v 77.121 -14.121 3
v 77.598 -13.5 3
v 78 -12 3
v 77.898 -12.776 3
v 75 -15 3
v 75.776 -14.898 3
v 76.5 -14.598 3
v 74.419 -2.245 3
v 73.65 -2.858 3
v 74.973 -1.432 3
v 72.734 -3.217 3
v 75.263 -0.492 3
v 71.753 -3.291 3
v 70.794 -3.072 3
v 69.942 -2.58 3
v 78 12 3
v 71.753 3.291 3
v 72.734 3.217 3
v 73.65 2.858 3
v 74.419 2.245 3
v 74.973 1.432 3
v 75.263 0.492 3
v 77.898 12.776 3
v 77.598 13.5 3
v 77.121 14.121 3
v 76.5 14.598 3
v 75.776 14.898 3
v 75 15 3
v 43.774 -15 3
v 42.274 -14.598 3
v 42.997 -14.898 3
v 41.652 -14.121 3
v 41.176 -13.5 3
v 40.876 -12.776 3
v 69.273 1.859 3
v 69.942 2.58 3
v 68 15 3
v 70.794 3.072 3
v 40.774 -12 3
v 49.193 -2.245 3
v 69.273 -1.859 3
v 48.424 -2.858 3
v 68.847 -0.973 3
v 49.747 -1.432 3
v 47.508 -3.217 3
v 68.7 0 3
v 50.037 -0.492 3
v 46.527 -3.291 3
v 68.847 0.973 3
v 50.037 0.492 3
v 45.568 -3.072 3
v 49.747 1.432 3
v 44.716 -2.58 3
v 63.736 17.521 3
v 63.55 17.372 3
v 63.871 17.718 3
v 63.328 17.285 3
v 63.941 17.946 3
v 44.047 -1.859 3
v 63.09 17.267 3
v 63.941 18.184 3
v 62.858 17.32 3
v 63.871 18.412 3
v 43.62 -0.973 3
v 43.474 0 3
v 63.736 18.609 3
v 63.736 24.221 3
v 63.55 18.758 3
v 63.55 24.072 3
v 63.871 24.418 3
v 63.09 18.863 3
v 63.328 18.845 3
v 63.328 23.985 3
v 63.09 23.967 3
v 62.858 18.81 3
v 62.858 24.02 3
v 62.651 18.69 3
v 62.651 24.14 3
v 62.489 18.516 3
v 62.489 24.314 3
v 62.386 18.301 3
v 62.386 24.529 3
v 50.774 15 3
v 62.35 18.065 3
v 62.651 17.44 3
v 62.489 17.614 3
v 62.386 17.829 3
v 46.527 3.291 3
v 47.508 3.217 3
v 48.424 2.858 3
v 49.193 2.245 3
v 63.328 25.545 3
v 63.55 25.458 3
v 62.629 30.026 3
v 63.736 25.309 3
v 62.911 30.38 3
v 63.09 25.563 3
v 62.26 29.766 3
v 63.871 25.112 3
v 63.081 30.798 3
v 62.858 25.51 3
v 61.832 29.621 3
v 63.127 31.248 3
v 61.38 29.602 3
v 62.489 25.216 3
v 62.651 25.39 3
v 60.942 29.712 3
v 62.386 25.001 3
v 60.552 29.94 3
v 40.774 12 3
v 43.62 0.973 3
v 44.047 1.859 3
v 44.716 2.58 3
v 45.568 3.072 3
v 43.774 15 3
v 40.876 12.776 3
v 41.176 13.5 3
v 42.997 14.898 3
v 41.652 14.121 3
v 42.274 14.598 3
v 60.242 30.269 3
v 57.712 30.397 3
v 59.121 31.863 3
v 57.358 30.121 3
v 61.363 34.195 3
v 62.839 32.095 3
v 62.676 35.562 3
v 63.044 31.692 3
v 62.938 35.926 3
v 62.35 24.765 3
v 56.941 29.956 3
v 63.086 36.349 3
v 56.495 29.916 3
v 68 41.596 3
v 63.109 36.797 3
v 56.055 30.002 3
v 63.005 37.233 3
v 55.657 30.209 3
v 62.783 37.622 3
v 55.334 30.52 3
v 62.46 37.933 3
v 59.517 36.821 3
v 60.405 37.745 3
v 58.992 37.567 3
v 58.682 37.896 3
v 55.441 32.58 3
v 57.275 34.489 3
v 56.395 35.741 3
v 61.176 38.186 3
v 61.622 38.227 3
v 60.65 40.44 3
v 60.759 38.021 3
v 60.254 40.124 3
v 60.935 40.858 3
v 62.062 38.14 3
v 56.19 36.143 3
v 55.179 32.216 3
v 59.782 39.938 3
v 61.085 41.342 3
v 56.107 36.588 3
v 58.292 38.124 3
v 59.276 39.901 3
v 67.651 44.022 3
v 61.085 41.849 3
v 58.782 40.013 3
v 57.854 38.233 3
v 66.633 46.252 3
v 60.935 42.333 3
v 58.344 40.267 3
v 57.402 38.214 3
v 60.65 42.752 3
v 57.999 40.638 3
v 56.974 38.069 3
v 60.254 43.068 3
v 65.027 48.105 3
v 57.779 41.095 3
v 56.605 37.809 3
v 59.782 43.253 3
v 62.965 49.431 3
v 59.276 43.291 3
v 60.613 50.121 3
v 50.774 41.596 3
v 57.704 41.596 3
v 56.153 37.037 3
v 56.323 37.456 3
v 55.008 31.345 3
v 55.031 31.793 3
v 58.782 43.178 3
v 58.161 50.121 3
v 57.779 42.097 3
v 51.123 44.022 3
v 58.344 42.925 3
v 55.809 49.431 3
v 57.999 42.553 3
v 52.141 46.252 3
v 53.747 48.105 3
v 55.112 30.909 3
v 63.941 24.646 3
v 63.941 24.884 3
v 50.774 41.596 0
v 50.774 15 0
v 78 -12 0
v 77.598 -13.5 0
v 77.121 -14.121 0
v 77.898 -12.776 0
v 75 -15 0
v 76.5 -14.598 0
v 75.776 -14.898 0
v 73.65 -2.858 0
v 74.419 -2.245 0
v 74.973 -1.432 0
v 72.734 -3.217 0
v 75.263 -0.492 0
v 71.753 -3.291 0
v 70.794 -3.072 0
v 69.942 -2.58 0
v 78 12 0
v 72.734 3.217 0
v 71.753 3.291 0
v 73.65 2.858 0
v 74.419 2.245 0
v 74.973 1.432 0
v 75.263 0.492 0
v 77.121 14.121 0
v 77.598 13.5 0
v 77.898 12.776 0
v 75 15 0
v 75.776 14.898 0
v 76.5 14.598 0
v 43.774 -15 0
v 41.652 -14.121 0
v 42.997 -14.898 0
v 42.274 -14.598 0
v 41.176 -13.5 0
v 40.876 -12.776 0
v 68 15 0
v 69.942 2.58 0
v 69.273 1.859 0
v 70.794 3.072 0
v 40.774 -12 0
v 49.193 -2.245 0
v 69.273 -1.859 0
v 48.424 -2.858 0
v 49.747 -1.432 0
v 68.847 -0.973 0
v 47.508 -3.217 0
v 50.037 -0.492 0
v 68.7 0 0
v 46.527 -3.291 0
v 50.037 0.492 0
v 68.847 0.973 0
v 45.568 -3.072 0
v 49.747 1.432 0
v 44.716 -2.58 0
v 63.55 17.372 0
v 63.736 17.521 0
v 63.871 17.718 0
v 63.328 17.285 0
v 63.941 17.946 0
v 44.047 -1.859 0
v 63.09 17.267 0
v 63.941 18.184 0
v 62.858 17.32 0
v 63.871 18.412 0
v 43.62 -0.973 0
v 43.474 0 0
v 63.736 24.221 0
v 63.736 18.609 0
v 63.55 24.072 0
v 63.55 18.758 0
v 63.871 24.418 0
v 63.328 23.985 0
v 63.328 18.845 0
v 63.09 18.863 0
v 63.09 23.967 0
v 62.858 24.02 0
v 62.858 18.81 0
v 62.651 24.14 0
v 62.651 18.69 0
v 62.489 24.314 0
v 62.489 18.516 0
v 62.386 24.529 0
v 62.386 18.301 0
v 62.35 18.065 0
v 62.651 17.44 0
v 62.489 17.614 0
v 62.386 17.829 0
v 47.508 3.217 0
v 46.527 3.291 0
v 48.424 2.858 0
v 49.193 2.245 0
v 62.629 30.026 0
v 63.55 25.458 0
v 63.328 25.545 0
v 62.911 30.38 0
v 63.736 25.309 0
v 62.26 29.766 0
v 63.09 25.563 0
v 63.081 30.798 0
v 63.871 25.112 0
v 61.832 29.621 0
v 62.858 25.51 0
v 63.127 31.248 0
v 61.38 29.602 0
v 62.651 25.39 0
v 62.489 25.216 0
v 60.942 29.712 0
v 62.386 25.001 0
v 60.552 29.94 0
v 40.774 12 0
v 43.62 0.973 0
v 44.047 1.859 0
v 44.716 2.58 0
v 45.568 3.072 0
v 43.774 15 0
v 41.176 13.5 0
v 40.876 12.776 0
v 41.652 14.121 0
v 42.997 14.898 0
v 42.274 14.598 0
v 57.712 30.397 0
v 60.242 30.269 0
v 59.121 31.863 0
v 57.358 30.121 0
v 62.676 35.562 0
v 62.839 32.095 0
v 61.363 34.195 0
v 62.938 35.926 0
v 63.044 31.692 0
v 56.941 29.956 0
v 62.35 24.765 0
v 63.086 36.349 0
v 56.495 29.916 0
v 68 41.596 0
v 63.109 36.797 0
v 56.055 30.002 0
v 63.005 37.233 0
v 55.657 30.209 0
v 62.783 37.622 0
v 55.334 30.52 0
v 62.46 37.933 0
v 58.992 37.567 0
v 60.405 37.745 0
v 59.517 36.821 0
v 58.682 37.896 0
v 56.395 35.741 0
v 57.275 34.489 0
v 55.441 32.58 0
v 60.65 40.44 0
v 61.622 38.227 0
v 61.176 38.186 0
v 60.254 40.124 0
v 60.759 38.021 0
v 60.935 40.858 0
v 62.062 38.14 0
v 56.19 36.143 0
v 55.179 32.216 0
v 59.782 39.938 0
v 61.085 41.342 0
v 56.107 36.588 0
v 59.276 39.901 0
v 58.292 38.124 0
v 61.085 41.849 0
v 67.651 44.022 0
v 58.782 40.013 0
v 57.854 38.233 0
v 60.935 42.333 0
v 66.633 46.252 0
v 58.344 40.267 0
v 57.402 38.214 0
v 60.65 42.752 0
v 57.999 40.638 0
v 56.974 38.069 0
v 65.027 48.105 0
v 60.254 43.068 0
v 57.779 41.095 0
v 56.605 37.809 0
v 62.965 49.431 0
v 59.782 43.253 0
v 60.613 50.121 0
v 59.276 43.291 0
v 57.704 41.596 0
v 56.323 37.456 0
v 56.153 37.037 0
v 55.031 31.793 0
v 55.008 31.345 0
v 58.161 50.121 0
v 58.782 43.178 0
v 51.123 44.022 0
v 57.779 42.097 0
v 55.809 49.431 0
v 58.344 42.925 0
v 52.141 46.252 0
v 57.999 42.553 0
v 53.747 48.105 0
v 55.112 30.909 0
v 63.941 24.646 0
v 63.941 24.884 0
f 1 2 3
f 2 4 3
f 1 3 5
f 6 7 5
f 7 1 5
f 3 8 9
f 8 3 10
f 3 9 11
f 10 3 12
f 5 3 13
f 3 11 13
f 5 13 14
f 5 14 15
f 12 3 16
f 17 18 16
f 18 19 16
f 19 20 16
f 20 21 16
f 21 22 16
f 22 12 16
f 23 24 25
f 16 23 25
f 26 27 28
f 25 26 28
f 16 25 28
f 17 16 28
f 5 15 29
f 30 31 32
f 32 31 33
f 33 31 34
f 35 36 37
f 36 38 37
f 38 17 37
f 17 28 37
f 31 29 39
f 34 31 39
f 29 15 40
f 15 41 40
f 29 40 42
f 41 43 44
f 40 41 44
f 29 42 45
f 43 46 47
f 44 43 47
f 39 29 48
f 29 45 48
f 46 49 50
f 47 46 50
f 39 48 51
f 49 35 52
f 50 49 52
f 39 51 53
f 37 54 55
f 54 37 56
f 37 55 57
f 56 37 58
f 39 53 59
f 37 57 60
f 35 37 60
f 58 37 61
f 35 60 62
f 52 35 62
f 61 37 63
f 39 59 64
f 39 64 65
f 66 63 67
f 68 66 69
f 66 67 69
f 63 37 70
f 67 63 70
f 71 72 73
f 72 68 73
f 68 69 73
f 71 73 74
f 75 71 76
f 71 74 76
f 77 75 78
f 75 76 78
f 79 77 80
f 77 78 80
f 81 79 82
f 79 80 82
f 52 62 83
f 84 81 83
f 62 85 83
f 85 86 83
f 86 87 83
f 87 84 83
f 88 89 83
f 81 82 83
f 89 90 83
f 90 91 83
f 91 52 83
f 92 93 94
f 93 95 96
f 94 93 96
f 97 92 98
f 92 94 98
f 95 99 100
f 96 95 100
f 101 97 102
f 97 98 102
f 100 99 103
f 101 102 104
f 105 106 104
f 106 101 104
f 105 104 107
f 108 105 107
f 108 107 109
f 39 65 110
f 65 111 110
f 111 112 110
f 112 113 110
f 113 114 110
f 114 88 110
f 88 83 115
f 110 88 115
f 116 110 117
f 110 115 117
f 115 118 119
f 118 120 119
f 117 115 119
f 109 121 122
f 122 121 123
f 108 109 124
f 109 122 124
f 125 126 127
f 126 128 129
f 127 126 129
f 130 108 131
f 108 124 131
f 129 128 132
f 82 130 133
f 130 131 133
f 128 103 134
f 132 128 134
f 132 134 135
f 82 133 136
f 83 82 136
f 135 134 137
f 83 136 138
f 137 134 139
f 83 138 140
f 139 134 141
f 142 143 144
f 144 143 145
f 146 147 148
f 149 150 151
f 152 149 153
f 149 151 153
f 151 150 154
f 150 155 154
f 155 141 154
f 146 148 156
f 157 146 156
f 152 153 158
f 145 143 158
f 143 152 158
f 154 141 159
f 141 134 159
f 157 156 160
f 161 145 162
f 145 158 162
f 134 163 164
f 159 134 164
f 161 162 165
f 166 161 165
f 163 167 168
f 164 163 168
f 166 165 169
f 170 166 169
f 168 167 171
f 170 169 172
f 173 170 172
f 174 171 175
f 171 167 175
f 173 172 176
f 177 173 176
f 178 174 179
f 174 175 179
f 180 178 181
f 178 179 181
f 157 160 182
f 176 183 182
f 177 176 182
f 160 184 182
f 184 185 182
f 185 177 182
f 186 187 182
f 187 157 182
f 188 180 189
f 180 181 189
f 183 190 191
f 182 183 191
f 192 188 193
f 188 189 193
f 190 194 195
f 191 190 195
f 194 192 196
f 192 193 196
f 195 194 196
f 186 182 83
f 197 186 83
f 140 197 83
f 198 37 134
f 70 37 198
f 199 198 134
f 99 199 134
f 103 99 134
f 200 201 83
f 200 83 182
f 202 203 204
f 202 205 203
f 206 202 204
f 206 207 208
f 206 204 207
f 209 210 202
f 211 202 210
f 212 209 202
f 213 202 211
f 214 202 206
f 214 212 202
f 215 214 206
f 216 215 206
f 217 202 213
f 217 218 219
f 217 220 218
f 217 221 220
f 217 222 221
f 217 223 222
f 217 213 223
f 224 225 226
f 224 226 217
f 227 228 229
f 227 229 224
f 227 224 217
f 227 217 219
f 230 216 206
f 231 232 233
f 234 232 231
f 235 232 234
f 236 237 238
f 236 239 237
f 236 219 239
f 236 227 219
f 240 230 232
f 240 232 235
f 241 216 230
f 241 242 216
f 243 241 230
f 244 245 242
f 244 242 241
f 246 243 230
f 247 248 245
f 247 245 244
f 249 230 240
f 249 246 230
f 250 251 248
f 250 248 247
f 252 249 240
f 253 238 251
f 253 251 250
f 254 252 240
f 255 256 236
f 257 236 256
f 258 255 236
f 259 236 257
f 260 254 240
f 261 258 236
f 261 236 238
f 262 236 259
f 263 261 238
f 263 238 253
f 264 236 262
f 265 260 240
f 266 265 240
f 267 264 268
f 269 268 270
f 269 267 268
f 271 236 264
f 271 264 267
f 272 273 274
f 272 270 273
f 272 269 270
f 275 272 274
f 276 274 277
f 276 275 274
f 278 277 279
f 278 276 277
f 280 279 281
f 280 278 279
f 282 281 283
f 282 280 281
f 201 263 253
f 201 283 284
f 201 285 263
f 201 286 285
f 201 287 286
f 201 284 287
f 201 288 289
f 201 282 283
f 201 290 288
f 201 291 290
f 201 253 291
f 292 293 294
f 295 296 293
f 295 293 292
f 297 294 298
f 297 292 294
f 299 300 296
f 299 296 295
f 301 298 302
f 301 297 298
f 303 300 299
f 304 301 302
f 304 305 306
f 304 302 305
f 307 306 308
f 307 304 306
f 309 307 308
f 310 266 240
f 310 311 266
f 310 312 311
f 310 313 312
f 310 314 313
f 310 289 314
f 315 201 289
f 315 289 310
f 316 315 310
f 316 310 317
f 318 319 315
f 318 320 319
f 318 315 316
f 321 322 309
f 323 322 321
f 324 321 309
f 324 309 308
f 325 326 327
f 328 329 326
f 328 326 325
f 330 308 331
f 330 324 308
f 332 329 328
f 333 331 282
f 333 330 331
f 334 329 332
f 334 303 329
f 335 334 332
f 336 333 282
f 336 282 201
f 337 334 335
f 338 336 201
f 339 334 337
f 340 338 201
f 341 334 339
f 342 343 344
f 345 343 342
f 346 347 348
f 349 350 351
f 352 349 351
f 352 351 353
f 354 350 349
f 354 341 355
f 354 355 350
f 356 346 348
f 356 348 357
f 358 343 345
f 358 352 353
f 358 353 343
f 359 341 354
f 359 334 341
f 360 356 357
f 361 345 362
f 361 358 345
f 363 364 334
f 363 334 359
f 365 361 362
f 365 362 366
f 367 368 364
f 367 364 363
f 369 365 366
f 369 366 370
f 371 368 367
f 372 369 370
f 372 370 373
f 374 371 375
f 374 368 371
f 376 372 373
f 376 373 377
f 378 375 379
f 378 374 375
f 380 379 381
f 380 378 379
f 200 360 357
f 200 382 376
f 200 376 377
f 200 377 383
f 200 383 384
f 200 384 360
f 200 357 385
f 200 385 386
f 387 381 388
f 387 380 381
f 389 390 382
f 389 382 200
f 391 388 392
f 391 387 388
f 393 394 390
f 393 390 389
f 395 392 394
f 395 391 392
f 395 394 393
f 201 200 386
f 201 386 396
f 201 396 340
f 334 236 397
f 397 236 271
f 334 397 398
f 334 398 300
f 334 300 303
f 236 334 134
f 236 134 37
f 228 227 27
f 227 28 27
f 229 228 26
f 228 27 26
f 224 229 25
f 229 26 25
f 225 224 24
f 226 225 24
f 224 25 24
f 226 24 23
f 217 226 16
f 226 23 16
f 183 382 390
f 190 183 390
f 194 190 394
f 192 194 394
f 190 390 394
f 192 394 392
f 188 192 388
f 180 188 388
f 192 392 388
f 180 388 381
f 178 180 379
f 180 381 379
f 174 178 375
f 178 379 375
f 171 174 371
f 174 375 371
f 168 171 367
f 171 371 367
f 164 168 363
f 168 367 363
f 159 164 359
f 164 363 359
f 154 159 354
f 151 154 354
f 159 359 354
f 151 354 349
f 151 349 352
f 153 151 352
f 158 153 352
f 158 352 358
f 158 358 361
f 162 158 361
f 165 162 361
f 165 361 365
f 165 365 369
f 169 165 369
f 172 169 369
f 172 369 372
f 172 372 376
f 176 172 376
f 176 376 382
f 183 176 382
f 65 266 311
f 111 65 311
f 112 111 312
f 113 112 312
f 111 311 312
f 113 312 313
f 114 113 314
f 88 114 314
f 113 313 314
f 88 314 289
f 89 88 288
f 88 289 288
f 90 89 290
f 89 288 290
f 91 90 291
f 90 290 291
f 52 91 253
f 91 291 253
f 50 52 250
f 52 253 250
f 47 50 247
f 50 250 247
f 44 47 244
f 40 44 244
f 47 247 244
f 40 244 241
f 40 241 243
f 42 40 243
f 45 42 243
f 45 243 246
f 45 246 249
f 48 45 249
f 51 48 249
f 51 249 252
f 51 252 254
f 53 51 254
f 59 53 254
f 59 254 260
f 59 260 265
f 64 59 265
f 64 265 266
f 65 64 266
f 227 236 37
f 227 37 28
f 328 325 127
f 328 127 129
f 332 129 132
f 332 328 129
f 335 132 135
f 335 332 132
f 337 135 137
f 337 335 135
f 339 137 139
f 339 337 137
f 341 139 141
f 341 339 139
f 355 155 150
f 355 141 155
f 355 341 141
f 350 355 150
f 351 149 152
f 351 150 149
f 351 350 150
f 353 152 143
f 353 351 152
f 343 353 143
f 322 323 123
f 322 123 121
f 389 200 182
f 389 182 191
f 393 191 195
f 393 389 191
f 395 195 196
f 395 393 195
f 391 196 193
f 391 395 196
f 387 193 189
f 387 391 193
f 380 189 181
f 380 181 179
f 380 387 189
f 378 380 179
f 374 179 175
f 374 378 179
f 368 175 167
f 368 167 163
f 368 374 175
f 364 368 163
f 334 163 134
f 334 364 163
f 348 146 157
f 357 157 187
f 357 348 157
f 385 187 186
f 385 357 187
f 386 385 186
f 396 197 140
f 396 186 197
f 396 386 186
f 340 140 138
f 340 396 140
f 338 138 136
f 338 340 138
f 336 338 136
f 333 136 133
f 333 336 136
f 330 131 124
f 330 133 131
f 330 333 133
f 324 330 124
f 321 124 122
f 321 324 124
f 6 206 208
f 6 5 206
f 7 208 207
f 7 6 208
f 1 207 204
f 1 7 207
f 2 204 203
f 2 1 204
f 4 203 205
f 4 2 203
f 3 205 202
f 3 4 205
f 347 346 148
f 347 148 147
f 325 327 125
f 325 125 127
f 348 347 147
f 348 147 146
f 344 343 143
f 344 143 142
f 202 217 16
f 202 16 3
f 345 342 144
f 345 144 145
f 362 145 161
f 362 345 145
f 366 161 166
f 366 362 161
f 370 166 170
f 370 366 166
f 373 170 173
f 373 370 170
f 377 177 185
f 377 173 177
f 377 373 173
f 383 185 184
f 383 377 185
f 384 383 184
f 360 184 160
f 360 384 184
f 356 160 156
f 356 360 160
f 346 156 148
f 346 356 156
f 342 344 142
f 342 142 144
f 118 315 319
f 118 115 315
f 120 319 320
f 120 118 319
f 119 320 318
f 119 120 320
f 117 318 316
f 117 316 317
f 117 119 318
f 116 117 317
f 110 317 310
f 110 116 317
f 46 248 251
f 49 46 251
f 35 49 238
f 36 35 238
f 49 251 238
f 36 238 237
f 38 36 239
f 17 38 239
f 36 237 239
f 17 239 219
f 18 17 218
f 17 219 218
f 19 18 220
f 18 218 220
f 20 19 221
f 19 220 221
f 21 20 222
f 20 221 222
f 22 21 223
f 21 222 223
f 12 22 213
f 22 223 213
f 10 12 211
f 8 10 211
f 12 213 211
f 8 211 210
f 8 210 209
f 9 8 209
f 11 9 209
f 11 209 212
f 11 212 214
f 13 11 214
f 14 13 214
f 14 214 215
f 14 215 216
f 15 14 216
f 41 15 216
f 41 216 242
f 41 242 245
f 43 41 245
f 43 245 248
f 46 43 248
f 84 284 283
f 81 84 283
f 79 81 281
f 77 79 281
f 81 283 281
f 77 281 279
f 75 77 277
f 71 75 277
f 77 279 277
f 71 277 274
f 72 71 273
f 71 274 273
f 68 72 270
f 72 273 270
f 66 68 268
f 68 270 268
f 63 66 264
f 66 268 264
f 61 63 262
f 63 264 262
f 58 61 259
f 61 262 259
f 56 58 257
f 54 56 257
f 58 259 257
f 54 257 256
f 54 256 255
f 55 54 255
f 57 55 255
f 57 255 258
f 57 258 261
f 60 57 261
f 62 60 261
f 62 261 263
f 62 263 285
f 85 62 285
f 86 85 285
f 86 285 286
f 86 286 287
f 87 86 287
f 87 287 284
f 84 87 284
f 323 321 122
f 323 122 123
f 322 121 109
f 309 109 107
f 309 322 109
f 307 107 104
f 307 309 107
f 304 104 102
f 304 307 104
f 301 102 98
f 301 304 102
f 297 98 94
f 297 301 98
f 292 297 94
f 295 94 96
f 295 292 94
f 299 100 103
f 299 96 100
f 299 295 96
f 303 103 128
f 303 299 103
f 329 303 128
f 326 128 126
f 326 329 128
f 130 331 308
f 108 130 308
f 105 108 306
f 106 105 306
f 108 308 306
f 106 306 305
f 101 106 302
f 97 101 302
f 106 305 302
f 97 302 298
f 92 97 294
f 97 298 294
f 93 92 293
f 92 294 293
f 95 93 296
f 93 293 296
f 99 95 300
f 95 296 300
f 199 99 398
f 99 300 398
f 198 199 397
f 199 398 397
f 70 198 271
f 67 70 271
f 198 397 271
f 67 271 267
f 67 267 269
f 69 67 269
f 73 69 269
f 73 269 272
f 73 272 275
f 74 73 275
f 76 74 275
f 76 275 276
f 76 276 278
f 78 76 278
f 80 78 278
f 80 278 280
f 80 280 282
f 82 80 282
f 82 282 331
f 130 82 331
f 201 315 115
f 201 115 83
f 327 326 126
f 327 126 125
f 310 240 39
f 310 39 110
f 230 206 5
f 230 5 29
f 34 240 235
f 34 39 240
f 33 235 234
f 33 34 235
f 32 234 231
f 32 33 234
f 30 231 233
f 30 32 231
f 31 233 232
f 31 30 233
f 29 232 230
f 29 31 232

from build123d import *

# Parameters (mm, degrees)
BOSS_EXTRUDE1_DEPTH     = 3
M3_CLEARANCE_HOLE1_D    = 3.4
M6_CLEARANCE_HOLE1_D    = 6.6
FILLET1_R               = 3
CUT_EXTRUDE1_DEPTH      = 10
TAP_DRILL_FOR_M2_TAP1_D = 1.6


with BuildPart() as part:
    # Sketch1 → Boss-Extrude1 (new body)
    with BuildSketch(Plane.XY):
        with BuildLine():
            Line((50.773782993, 15), (50.773782993, 41.5958))
            ThreePointArc((50.773782993, 41.5958), (59.386891497, 50.208908503), (68, 41.5958))
            Line((68, 41.5958), (68, 15))
            Line((68, 15), (78, 15))
            Line((78, 15), (78, -15))
            Line((78, -15), (40.773782993, -15))
            Line((40.773782993, -15), (40.773782993, 15))
            Line((40.773782993, 15), (50.773782993, 15))
        make_face()
    extrude(amount=BOSS_EXTRUDE1_DEPTH)

    # M3 Clearance Hole1 (through all)
    with Locations(Plane.XY.offset(3)):
        with Locations((59.40350934, 41.5958)):
            Hole(M3_CLEARANCE_HOLE1_D / 2)

    # M6 Clearance Hole1 (through all)
    with Locations(Plane.XY.offset(3)):
        with Locations((46.773782993, 0), (72, 0)):
            Hole(M6_CLEARANCE_HOLE1_D / 2)

    # Fillet1
    fillet1_edges = [part.edges().sort_by_distance(p)[0] for p in [
        (78, -15, 1.5),
        (40.773782993, -15, 1.5),
        (40.773782993, 15, 1.5),
        (78, 15, 1.5),
    ]]
    fillet(fillet1_edges, radius=FILLET1_R)

    # Sketch6 → Cut-Extrude1 (cut)
    with BuildSketch(Plane(origin=(0, 0, 0), x_dir=(-1, 0, 0), z_dir=(0, 0, -1))):
        with BuildLine():
            Line((-59.121027546, 31.863253301), (-60.242174181, 30.268733642))
            ThreePointArc((-60.242174181, 30.268733642), (-62.453888564, 29.883205447), (-62.839416759, 32.09491983))
            Line((-62.839416759, 32.09491983), (-61.362577576, 34.195313335))
            Line((-61.362577576, 34.195313335), (-62.6763448, 35.562128261))
            ThreePointArc((-62.6763448, 35.562128261), (-62.63227279, 37.789154911), (-60.40524614, 37.7450829))
            Line((-60.40524614, 37.7450829), (-59.516660479, 36.820617651))
            Line((-59.516660479, 36.820617651), (-58.992072259, 37.566698674))
            ThreePointArc((-58.992072259, 37.566698674), (-56.780357876, 37.952226869), (-56.394829681, 35.740512487))
            Line((-56.394829681, 35.740512487), (-57.275110449, 34.488557618))
            Line((-57.275110449, 34.488557618), (-55.440588029, 32.579960282))
            ThreePointArc((-55.440588029, 32.579960282), (-55.484660039, 30.352933632), (-57.71168669, 30.397005642))
            Line((-57.71168669, 30.397005642), (-59.121027546, 31.863253301))
        make_face()
    extrude(amount=-CUT_EXTRUDE1_DEPTH, mode=Mode.SUBTRACT)

    # Tap Drill for M2 Tap1 (through all)
    with Locations(Plane.XY.offset(3)):
        with Locations((63.15, 24.765), (63.15, 18.065)):
            Hole(TAP_DRILL_FOR_M2_TAP1_D / 2)


solid = part.part
